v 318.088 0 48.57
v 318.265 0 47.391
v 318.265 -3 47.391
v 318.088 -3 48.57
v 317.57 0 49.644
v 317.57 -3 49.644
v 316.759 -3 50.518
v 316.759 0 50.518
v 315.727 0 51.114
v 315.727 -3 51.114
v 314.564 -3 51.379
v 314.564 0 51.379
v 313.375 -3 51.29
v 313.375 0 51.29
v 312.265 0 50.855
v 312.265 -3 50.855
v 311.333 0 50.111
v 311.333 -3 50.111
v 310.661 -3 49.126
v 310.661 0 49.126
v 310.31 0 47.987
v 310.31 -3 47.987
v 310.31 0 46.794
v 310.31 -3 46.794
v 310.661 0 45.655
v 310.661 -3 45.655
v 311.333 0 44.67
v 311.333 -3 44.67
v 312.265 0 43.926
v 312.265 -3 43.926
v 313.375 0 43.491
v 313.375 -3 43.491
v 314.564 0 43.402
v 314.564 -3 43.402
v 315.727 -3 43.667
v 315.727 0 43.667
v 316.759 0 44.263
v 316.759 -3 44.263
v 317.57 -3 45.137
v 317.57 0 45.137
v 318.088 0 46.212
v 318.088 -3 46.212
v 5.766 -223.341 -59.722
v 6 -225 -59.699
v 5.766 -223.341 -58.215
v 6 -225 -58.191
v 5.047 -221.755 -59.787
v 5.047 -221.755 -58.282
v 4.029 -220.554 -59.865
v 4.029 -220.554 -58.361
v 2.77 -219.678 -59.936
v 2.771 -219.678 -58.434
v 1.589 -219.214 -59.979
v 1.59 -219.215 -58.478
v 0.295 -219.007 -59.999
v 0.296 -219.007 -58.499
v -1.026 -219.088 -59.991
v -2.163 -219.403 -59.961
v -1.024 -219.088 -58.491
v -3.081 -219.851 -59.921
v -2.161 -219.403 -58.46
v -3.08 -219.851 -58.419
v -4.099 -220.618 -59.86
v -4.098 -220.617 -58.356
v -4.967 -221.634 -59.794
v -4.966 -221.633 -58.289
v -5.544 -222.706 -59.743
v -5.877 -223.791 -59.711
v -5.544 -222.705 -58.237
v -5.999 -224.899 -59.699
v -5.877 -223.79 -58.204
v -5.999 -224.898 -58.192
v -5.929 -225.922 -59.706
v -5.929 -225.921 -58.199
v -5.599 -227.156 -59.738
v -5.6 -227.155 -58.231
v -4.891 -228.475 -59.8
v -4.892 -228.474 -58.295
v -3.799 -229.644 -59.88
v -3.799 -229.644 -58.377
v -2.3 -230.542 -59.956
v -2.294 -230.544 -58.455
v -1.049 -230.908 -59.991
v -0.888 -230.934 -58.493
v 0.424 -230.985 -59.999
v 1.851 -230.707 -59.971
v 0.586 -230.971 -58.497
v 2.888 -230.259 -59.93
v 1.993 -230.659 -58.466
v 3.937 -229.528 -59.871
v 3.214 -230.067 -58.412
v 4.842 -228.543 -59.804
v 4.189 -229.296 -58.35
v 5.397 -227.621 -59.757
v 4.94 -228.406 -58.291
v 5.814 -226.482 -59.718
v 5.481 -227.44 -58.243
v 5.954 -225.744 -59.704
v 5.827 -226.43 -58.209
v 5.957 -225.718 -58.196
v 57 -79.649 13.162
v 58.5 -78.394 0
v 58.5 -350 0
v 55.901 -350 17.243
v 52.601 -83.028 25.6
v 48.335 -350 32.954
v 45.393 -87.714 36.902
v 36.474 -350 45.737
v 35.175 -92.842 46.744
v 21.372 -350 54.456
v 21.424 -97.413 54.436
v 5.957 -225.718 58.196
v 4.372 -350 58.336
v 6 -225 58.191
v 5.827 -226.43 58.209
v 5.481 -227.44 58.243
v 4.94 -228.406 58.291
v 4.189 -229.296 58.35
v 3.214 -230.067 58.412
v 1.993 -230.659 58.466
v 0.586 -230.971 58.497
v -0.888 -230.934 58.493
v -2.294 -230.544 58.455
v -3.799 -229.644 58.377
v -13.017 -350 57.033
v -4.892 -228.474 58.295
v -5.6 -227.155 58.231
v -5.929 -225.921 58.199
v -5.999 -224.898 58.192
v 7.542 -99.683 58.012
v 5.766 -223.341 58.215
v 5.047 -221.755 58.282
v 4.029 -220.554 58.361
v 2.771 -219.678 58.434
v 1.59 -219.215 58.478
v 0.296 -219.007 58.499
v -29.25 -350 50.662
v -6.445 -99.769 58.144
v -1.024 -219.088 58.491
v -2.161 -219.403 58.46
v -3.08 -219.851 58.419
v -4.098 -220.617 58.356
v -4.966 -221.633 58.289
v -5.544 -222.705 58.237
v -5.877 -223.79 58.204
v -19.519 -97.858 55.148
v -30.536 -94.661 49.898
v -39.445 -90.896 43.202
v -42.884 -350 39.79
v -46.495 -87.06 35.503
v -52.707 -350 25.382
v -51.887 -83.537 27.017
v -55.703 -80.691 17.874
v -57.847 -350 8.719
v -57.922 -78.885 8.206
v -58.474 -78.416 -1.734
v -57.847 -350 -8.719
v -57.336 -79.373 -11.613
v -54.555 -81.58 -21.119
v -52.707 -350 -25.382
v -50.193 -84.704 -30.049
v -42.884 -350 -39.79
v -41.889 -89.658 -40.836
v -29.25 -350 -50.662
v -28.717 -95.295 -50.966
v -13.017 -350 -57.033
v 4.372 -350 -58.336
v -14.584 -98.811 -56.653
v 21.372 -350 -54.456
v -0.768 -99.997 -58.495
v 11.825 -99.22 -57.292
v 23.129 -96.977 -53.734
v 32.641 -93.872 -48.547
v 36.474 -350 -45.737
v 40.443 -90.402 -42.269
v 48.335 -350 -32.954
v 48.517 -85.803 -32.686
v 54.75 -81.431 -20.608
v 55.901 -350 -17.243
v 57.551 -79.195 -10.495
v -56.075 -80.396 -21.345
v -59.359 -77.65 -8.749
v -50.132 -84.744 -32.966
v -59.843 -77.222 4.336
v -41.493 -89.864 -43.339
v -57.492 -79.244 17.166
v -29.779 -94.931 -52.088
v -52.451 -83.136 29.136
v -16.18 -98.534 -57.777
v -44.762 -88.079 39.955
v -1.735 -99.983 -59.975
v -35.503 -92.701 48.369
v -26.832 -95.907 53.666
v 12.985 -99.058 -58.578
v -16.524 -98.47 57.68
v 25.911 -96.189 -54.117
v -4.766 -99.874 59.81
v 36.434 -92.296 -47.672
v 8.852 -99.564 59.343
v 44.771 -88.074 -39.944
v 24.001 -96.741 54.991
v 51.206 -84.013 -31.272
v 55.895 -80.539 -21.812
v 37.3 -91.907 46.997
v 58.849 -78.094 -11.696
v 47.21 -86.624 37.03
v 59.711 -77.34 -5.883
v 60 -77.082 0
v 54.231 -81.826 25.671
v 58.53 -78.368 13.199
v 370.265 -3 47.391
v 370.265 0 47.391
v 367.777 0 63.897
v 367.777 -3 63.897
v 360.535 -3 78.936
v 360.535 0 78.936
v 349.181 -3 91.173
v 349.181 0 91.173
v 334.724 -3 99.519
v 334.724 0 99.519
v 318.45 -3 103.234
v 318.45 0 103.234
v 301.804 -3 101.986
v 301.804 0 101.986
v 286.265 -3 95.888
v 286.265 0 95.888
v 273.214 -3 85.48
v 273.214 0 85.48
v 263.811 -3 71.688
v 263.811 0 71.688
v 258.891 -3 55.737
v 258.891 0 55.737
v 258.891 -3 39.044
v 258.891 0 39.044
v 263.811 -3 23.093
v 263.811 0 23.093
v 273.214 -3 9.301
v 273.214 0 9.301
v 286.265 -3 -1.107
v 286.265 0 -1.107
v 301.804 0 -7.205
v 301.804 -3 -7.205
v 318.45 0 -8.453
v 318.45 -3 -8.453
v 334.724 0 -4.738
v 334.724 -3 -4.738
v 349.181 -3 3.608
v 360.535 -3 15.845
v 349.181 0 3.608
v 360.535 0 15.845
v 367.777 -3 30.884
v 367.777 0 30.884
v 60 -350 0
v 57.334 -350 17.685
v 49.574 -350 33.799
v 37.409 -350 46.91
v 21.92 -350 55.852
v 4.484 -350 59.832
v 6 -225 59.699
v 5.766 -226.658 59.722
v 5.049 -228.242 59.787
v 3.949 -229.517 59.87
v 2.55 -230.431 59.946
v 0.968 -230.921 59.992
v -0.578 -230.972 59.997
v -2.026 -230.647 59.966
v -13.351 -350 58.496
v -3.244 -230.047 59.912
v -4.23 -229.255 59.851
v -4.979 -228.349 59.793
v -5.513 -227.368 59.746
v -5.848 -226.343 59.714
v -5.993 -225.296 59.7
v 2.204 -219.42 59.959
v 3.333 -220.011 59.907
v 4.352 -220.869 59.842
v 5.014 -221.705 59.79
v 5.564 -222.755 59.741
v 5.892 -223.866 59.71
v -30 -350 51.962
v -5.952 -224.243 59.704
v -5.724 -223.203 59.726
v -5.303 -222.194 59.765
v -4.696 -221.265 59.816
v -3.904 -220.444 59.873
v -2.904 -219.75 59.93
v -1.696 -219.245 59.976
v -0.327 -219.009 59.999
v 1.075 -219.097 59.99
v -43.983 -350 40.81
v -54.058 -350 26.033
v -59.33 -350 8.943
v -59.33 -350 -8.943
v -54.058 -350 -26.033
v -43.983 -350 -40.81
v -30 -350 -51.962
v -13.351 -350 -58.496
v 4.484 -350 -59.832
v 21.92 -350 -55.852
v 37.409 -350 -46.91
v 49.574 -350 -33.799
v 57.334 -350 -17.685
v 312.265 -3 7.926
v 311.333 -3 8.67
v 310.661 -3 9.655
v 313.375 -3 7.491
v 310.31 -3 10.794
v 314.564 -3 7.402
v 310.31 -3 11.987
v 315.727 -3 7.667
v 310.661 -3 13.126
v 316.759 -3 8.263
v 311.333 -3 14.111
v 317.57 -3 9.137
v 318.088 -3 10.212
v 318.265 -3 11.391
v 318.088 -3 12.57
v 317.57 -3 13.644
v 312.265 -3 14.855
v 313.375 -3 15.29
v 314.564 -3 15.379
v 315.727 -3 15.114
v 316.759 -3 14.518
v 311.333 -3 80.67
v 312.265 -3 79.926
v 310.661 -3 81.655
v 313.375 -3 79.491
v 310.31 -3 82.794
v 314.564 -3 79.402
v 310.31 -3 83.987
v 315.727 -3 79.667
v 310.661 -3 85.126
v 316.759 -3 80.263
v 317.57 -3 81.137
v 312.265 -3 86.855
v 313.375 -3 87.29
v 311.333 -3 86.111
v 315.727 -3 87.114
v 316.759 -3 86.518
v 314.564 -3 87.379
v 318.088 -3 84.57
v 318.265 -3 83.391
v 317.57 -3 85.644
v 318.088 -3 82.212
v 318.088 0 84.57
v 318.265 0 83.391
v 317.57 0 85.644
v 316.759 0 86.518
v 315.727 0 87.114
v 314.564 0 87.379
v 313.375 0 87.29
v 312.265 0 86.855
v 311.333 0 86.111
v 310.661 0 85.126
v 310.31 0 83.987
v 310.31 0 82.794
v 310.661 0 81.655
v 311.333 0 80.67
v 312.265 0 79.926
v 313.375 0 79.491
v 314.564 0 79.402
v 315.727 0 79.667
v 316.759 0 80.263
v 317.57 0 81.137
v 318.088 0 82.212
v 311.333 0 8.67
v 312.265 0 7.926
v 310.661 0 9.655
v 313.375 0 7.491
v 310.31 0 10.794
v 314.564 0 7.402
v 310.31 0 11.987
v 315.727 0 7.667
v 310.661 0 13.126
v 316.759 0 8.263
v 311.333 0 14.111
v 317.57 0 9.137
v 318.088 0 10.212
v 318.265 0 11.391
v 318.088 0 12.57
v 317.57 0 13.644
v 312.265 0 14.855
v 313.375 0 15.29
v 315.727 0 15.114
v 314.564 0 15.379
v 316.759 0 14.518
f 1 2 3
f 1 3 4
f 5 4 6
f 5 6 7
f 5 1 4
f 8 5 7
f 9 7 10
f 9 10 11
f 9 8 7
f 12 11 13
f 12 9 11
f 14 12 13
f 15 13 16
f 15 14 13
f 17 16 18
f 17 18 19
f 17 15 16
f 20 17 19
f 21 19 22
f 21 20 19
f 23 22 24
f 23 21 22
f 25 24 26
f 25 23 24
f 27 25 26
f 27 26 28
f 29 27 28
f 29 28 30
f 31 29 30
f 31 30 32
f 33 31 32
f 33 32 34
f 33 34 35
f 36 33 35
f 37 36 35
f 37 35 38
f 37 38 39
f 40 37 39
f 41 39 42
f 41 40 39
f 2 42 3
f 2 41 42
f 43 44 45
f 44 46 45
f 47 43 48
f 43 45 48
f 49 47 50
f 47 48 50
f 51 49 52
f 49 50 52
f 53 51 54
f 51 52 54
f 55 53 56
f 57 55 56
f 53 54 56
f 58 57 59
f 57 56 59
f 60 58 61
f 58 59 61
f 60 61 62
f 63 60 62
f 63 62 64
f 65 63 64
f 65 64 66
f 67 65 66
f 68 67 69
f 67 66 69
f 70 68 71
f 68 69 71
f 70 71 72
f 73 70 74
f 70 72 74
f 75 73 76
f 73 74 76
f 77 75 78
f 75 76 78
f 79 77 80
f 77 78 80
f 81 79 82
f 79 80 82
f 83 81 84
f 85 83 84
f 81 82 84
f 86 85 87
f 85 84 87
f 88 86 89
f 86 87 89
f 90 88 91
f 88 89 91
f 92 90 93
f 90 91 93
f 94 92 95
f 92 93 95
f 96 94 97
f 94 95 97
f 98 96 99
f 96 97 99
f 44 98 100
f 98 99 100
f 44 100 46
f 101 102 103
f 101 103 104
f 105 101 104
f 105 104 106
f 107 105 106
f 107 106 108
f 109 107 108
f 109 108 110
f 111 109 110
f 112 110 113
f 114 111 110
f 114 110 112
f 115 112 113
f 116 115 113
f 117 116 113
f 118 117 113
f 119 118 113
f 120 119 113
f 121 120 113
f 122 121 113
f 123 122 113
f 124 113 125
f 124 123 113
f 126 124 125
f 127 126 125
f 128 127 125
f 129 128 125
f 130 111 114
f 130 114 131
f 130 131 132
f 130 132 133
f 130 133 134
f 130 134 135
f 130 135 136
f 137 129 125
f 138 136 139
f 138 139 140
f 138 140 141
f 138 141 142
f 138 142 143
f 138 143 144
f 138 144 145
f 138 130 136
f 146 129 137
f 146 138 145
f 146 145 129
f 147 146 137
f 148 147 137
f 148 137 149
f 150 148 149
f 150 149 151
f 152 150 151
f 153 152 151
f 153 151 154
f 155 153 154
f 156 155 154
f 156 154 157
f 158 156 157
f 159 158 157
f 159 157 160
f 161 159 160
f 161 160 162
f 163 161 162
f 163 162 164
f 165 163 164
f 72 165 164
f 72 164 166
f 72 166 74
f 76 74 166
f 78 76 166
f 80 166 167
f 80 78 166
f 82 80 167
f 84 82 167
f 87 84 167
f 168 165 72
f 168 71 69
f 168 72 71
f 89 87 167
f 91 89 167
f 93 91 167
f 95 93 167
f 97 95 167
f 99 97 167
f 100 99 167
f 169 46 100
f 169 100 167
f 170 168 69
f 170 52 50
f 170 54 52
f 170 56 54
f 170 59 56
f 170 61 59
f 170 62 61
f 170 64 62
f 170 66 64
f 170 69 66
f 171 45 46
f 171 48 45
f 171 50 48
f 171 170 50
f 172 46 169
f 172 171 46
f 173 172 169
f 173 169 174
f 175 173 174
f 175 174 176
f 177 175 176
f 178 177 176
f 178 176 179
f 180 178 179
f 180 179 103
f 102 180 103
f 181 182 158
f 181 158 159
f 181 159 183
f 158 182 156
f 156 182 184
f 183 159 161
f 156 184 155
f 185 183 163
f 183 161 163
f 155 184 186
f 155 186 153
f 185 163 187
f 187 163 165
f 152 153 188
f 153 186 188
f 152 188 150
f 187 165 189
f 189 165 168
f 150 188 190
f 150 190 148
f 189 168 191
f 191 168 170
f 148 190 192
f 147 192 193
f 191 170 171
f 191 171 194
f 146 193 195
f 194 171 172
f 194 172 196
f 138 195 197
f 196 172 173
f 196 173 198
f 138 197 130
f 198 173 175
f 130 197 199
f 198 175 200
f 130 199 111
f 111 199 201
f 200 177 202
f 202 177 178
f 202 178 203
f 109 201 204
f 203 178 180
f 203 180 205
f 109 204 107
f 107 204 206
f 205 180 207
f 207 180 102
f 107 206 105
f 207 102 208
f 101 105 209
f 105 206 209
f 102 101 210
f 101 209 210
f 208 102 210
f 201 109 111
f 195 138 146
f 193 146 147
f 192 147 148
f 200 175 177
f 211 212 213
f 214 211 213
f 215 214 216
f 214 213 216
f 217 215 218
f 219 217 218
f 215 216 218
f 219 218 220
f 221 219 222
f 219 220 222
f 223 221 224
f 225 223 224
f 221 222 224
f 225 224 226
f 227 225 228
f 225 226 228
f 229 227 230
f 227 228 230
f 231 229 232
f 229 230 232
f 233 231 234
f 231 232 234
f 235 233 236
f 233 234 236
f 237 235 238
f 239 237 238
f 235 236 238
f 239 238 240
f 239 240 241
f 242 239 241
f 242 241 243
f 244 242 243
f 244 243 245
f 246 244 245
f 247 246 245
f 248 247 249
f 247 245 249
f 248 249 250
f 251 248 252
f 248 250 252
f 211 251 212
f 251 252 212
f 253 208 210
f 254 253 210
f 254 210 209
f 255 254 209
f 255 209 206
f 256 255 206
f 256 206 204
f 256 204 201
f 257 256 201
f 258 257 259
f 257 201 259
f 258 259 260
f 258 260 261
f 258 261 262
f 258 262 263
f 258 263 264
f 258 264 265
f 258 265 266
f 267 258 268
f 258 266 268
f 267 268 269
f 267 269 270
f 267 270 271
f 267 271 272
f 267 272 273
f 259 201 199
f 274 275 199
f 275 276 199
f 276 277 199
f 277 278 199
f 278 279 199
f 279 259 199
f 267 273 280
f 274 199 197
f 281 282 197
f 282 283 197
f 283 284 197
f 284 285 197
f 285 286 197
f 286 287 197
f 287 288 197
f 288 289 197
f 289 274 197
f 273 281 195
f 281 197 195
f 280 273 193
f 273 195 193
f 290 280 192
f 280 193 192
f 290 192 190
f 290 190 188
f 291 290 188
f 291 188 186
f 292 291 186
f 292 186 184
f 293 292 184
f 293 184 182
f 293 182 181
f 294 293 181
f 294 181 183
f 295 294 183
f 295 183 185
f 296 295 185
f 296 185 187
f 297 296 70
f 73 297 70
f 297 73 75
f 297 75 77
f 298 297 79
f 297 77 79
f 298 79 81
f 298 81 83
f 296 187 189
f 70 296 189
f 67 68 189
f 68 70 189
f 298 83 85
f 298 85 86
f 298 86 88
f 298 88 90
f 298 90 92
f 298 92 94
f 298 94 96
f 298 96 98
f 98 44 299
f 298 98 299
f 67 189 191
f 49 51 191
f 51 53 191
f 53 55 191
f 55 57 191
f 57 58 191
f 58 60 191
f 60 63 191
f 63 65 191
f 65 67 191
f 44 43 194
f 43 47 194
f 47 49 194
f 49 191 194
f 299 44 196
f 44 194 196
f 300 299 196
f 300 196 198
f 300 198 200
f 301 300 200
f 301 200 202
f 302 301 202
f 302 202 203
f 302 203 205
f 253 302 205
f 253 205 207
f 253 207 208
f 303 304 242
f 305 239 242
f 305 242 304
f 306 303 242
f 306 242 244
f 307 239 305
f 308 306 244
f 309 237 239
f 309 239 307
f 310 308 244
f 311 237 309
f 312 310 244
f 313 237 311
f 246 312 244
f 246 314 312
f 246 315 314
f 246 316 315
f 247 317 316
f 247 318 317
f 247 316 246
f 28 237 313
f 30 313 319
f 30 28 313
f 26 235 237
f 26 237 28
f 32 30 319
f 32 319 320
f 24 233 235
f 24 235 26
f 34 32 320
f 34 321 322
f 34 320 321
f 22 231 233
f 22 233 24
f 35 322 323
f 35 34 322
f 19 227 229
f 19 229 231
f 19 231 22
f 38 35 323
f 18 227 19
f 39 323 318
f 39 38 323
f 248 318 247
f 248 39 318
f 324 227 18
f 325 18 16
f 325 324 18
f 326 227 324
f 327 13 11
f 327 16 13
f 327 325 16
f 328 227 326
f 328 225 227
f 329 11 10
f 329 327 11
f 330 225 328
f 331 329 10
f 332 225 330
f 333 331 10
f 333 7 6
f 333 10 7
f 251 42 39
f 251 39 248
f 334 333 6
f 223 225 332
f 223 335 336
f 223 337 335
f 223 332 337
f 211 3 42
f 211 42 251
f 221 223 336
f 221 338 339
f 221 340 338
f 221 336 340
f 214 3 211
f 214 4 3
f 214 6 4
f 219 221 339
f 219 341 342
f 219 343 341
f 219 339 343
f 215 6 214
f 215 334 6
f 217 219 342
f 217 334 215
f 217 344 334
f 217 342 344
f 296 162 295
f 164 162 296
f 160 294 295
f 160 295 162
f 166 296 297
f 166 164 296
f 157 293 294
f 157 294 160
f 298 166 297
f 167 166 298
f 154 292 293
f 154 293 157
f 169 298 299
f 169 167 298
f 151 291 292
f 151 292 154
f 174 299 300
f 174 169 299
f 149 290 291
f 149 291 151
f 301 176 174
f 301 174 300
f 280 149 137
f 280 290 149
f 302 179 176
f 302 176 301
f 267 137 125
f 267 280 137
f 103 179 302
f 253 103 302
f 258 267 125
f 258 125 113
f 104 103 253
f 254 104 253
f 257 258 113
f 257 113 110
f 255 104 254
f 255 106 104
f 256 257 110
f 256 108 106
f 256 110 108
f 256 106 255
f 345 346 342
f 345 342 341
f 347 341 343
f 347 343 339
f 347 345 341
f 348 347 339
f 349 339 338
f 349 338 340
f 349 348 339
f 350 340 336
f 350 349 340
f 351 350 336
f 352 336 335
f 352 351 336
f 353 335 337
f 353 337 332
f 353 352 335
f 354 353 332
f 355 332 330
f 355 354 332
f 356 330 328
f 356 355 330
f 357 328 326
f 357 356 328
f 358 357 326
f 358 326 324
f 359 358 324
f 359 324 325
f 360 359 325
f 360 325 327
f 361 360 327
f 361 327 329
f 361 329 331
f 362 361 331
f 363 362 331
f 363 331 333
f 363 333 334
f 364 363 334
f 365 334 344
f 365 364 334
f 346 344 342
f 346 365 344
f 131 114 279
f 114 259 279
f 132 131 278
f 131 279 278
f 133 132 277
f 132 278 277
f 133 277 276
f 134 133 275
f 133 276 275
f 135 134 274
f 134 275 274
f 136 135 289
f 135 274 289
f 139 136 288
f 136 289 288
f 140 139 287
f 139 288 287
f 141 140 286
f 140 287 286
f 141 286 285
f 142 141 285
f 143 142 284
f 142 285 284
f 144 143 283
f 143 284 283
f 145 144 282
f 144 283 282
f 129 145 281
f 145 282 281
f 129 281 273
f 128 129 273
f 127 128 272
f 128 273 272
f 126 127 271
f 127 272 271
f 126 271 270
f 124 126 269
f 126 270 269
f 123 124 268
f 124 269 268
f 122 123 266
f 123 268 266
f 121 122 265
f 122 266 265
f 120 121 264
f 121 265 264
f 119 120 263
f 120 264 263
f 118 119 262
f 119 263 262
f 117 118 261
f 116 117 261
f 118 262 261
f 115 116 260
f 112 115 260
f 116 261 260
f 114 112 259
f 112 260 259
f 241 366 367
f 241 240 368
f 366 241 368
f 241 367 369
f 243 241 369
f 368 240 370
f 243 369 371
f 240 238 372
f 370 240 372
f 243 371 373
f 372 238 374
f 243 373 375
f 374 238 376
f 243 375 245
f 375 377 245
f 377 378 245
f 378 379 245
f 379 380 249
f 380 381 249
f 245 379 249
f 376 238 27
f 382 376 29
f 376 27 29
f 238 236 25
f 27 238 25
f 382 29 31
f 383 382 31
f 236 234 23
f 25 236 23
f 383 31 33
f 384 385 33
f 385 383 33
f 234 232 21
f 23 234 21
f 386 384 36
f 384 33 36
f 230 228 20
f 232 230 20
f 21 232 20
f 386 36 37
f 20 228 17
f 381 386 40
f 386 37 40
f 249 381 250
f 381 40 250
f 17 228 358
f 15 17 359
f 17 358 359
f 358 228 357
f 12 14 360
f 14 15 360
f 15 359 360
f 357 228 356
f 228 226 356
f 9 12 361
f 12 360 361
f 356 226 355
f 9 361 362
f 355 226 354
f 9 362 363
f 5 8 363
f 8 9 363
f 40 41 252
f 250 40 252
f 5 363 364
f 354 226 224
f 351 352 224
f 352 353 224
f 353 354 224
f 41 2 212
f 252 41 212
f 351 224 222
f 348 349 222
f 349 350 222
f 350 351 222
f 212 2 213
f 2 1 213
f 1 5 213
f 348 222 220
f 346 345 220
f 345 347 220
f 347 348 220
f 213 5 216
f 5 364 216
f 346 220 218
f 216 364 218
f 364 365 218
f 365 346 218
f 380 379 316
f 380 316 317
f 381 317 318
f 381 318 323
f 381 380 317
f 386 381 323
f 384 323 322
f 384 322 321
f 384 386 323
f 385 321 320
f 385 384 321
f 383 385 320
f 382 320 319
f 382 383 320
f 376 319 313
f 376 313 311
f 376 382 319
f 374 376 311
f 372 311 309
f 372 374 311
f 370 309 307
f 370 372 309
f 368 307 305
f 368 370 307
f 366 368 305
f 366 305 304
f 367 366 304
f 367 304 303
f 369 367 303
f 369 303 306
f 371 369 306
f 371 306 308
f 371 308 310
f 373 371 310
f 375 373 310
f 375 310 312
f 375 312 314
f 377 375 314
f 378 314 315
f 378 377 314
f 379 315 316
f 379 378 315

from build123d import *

# Parameters (mm, degrees)
F0_R     = 60
F0_R_2   = 58.5
F1_DEPTH = 350
F2_R     = 90
F3_DEPTH = 60
F4_R     = 6
F5_DEPTH = 60
F6_R     = 56
F6_R_2   = 4
F7_DEPTH = 3


with BuildPart() as f1:
    # F0 (on Front) → F1 (new body)
    with BuildSketch(Plane.XZ):
        Circle(F0_R)
        Circle(F0_R_2, mode=Mode.SUBTRACT)
    extrude(amount=F1_DEPTH)

    # F2 (on Top) → F3 (cut, symmetric)
    with BuildSketch(Plane.XY):
        with Locations((0, -10)):
            Circle(F2_R)
    extrude(amount=F3_DEPTH, both=True, mode=Mode.SUBTRACT)

    # F4 (on Top) → F5 (cut, symmetric)
    with BuildSketch(Plane.XY):
        with Locations((0, -225)):
            Circle(F4_R)
    extrude(amount=F5_DEPTH, both=True, mode=Mode.SUBTRACT)


with BuildPart() as f7:
    # F6 (on Front) → F7 (new body)
    with BuildSketch(Plane.XZ):
        with Locations((314.265341, 47.390533)):
            Circle(F6_R)
        with Locations((314.265341, 11.390533)):
            Circle(F6_R_2, mode=Mode.SUBTRACT)
        with Locations((314.265341, 47.390533)):
            Circle(F6_R_2, mode=Mode.SUBTRACT)
        with Locations((314.265341, 83.390533)):
            Circle(F6_R_2, mode=Mode.SUBTRACT)
    extrude(amount=F7_DEPTH)


solid = Compound([f1.part, f7.part])
